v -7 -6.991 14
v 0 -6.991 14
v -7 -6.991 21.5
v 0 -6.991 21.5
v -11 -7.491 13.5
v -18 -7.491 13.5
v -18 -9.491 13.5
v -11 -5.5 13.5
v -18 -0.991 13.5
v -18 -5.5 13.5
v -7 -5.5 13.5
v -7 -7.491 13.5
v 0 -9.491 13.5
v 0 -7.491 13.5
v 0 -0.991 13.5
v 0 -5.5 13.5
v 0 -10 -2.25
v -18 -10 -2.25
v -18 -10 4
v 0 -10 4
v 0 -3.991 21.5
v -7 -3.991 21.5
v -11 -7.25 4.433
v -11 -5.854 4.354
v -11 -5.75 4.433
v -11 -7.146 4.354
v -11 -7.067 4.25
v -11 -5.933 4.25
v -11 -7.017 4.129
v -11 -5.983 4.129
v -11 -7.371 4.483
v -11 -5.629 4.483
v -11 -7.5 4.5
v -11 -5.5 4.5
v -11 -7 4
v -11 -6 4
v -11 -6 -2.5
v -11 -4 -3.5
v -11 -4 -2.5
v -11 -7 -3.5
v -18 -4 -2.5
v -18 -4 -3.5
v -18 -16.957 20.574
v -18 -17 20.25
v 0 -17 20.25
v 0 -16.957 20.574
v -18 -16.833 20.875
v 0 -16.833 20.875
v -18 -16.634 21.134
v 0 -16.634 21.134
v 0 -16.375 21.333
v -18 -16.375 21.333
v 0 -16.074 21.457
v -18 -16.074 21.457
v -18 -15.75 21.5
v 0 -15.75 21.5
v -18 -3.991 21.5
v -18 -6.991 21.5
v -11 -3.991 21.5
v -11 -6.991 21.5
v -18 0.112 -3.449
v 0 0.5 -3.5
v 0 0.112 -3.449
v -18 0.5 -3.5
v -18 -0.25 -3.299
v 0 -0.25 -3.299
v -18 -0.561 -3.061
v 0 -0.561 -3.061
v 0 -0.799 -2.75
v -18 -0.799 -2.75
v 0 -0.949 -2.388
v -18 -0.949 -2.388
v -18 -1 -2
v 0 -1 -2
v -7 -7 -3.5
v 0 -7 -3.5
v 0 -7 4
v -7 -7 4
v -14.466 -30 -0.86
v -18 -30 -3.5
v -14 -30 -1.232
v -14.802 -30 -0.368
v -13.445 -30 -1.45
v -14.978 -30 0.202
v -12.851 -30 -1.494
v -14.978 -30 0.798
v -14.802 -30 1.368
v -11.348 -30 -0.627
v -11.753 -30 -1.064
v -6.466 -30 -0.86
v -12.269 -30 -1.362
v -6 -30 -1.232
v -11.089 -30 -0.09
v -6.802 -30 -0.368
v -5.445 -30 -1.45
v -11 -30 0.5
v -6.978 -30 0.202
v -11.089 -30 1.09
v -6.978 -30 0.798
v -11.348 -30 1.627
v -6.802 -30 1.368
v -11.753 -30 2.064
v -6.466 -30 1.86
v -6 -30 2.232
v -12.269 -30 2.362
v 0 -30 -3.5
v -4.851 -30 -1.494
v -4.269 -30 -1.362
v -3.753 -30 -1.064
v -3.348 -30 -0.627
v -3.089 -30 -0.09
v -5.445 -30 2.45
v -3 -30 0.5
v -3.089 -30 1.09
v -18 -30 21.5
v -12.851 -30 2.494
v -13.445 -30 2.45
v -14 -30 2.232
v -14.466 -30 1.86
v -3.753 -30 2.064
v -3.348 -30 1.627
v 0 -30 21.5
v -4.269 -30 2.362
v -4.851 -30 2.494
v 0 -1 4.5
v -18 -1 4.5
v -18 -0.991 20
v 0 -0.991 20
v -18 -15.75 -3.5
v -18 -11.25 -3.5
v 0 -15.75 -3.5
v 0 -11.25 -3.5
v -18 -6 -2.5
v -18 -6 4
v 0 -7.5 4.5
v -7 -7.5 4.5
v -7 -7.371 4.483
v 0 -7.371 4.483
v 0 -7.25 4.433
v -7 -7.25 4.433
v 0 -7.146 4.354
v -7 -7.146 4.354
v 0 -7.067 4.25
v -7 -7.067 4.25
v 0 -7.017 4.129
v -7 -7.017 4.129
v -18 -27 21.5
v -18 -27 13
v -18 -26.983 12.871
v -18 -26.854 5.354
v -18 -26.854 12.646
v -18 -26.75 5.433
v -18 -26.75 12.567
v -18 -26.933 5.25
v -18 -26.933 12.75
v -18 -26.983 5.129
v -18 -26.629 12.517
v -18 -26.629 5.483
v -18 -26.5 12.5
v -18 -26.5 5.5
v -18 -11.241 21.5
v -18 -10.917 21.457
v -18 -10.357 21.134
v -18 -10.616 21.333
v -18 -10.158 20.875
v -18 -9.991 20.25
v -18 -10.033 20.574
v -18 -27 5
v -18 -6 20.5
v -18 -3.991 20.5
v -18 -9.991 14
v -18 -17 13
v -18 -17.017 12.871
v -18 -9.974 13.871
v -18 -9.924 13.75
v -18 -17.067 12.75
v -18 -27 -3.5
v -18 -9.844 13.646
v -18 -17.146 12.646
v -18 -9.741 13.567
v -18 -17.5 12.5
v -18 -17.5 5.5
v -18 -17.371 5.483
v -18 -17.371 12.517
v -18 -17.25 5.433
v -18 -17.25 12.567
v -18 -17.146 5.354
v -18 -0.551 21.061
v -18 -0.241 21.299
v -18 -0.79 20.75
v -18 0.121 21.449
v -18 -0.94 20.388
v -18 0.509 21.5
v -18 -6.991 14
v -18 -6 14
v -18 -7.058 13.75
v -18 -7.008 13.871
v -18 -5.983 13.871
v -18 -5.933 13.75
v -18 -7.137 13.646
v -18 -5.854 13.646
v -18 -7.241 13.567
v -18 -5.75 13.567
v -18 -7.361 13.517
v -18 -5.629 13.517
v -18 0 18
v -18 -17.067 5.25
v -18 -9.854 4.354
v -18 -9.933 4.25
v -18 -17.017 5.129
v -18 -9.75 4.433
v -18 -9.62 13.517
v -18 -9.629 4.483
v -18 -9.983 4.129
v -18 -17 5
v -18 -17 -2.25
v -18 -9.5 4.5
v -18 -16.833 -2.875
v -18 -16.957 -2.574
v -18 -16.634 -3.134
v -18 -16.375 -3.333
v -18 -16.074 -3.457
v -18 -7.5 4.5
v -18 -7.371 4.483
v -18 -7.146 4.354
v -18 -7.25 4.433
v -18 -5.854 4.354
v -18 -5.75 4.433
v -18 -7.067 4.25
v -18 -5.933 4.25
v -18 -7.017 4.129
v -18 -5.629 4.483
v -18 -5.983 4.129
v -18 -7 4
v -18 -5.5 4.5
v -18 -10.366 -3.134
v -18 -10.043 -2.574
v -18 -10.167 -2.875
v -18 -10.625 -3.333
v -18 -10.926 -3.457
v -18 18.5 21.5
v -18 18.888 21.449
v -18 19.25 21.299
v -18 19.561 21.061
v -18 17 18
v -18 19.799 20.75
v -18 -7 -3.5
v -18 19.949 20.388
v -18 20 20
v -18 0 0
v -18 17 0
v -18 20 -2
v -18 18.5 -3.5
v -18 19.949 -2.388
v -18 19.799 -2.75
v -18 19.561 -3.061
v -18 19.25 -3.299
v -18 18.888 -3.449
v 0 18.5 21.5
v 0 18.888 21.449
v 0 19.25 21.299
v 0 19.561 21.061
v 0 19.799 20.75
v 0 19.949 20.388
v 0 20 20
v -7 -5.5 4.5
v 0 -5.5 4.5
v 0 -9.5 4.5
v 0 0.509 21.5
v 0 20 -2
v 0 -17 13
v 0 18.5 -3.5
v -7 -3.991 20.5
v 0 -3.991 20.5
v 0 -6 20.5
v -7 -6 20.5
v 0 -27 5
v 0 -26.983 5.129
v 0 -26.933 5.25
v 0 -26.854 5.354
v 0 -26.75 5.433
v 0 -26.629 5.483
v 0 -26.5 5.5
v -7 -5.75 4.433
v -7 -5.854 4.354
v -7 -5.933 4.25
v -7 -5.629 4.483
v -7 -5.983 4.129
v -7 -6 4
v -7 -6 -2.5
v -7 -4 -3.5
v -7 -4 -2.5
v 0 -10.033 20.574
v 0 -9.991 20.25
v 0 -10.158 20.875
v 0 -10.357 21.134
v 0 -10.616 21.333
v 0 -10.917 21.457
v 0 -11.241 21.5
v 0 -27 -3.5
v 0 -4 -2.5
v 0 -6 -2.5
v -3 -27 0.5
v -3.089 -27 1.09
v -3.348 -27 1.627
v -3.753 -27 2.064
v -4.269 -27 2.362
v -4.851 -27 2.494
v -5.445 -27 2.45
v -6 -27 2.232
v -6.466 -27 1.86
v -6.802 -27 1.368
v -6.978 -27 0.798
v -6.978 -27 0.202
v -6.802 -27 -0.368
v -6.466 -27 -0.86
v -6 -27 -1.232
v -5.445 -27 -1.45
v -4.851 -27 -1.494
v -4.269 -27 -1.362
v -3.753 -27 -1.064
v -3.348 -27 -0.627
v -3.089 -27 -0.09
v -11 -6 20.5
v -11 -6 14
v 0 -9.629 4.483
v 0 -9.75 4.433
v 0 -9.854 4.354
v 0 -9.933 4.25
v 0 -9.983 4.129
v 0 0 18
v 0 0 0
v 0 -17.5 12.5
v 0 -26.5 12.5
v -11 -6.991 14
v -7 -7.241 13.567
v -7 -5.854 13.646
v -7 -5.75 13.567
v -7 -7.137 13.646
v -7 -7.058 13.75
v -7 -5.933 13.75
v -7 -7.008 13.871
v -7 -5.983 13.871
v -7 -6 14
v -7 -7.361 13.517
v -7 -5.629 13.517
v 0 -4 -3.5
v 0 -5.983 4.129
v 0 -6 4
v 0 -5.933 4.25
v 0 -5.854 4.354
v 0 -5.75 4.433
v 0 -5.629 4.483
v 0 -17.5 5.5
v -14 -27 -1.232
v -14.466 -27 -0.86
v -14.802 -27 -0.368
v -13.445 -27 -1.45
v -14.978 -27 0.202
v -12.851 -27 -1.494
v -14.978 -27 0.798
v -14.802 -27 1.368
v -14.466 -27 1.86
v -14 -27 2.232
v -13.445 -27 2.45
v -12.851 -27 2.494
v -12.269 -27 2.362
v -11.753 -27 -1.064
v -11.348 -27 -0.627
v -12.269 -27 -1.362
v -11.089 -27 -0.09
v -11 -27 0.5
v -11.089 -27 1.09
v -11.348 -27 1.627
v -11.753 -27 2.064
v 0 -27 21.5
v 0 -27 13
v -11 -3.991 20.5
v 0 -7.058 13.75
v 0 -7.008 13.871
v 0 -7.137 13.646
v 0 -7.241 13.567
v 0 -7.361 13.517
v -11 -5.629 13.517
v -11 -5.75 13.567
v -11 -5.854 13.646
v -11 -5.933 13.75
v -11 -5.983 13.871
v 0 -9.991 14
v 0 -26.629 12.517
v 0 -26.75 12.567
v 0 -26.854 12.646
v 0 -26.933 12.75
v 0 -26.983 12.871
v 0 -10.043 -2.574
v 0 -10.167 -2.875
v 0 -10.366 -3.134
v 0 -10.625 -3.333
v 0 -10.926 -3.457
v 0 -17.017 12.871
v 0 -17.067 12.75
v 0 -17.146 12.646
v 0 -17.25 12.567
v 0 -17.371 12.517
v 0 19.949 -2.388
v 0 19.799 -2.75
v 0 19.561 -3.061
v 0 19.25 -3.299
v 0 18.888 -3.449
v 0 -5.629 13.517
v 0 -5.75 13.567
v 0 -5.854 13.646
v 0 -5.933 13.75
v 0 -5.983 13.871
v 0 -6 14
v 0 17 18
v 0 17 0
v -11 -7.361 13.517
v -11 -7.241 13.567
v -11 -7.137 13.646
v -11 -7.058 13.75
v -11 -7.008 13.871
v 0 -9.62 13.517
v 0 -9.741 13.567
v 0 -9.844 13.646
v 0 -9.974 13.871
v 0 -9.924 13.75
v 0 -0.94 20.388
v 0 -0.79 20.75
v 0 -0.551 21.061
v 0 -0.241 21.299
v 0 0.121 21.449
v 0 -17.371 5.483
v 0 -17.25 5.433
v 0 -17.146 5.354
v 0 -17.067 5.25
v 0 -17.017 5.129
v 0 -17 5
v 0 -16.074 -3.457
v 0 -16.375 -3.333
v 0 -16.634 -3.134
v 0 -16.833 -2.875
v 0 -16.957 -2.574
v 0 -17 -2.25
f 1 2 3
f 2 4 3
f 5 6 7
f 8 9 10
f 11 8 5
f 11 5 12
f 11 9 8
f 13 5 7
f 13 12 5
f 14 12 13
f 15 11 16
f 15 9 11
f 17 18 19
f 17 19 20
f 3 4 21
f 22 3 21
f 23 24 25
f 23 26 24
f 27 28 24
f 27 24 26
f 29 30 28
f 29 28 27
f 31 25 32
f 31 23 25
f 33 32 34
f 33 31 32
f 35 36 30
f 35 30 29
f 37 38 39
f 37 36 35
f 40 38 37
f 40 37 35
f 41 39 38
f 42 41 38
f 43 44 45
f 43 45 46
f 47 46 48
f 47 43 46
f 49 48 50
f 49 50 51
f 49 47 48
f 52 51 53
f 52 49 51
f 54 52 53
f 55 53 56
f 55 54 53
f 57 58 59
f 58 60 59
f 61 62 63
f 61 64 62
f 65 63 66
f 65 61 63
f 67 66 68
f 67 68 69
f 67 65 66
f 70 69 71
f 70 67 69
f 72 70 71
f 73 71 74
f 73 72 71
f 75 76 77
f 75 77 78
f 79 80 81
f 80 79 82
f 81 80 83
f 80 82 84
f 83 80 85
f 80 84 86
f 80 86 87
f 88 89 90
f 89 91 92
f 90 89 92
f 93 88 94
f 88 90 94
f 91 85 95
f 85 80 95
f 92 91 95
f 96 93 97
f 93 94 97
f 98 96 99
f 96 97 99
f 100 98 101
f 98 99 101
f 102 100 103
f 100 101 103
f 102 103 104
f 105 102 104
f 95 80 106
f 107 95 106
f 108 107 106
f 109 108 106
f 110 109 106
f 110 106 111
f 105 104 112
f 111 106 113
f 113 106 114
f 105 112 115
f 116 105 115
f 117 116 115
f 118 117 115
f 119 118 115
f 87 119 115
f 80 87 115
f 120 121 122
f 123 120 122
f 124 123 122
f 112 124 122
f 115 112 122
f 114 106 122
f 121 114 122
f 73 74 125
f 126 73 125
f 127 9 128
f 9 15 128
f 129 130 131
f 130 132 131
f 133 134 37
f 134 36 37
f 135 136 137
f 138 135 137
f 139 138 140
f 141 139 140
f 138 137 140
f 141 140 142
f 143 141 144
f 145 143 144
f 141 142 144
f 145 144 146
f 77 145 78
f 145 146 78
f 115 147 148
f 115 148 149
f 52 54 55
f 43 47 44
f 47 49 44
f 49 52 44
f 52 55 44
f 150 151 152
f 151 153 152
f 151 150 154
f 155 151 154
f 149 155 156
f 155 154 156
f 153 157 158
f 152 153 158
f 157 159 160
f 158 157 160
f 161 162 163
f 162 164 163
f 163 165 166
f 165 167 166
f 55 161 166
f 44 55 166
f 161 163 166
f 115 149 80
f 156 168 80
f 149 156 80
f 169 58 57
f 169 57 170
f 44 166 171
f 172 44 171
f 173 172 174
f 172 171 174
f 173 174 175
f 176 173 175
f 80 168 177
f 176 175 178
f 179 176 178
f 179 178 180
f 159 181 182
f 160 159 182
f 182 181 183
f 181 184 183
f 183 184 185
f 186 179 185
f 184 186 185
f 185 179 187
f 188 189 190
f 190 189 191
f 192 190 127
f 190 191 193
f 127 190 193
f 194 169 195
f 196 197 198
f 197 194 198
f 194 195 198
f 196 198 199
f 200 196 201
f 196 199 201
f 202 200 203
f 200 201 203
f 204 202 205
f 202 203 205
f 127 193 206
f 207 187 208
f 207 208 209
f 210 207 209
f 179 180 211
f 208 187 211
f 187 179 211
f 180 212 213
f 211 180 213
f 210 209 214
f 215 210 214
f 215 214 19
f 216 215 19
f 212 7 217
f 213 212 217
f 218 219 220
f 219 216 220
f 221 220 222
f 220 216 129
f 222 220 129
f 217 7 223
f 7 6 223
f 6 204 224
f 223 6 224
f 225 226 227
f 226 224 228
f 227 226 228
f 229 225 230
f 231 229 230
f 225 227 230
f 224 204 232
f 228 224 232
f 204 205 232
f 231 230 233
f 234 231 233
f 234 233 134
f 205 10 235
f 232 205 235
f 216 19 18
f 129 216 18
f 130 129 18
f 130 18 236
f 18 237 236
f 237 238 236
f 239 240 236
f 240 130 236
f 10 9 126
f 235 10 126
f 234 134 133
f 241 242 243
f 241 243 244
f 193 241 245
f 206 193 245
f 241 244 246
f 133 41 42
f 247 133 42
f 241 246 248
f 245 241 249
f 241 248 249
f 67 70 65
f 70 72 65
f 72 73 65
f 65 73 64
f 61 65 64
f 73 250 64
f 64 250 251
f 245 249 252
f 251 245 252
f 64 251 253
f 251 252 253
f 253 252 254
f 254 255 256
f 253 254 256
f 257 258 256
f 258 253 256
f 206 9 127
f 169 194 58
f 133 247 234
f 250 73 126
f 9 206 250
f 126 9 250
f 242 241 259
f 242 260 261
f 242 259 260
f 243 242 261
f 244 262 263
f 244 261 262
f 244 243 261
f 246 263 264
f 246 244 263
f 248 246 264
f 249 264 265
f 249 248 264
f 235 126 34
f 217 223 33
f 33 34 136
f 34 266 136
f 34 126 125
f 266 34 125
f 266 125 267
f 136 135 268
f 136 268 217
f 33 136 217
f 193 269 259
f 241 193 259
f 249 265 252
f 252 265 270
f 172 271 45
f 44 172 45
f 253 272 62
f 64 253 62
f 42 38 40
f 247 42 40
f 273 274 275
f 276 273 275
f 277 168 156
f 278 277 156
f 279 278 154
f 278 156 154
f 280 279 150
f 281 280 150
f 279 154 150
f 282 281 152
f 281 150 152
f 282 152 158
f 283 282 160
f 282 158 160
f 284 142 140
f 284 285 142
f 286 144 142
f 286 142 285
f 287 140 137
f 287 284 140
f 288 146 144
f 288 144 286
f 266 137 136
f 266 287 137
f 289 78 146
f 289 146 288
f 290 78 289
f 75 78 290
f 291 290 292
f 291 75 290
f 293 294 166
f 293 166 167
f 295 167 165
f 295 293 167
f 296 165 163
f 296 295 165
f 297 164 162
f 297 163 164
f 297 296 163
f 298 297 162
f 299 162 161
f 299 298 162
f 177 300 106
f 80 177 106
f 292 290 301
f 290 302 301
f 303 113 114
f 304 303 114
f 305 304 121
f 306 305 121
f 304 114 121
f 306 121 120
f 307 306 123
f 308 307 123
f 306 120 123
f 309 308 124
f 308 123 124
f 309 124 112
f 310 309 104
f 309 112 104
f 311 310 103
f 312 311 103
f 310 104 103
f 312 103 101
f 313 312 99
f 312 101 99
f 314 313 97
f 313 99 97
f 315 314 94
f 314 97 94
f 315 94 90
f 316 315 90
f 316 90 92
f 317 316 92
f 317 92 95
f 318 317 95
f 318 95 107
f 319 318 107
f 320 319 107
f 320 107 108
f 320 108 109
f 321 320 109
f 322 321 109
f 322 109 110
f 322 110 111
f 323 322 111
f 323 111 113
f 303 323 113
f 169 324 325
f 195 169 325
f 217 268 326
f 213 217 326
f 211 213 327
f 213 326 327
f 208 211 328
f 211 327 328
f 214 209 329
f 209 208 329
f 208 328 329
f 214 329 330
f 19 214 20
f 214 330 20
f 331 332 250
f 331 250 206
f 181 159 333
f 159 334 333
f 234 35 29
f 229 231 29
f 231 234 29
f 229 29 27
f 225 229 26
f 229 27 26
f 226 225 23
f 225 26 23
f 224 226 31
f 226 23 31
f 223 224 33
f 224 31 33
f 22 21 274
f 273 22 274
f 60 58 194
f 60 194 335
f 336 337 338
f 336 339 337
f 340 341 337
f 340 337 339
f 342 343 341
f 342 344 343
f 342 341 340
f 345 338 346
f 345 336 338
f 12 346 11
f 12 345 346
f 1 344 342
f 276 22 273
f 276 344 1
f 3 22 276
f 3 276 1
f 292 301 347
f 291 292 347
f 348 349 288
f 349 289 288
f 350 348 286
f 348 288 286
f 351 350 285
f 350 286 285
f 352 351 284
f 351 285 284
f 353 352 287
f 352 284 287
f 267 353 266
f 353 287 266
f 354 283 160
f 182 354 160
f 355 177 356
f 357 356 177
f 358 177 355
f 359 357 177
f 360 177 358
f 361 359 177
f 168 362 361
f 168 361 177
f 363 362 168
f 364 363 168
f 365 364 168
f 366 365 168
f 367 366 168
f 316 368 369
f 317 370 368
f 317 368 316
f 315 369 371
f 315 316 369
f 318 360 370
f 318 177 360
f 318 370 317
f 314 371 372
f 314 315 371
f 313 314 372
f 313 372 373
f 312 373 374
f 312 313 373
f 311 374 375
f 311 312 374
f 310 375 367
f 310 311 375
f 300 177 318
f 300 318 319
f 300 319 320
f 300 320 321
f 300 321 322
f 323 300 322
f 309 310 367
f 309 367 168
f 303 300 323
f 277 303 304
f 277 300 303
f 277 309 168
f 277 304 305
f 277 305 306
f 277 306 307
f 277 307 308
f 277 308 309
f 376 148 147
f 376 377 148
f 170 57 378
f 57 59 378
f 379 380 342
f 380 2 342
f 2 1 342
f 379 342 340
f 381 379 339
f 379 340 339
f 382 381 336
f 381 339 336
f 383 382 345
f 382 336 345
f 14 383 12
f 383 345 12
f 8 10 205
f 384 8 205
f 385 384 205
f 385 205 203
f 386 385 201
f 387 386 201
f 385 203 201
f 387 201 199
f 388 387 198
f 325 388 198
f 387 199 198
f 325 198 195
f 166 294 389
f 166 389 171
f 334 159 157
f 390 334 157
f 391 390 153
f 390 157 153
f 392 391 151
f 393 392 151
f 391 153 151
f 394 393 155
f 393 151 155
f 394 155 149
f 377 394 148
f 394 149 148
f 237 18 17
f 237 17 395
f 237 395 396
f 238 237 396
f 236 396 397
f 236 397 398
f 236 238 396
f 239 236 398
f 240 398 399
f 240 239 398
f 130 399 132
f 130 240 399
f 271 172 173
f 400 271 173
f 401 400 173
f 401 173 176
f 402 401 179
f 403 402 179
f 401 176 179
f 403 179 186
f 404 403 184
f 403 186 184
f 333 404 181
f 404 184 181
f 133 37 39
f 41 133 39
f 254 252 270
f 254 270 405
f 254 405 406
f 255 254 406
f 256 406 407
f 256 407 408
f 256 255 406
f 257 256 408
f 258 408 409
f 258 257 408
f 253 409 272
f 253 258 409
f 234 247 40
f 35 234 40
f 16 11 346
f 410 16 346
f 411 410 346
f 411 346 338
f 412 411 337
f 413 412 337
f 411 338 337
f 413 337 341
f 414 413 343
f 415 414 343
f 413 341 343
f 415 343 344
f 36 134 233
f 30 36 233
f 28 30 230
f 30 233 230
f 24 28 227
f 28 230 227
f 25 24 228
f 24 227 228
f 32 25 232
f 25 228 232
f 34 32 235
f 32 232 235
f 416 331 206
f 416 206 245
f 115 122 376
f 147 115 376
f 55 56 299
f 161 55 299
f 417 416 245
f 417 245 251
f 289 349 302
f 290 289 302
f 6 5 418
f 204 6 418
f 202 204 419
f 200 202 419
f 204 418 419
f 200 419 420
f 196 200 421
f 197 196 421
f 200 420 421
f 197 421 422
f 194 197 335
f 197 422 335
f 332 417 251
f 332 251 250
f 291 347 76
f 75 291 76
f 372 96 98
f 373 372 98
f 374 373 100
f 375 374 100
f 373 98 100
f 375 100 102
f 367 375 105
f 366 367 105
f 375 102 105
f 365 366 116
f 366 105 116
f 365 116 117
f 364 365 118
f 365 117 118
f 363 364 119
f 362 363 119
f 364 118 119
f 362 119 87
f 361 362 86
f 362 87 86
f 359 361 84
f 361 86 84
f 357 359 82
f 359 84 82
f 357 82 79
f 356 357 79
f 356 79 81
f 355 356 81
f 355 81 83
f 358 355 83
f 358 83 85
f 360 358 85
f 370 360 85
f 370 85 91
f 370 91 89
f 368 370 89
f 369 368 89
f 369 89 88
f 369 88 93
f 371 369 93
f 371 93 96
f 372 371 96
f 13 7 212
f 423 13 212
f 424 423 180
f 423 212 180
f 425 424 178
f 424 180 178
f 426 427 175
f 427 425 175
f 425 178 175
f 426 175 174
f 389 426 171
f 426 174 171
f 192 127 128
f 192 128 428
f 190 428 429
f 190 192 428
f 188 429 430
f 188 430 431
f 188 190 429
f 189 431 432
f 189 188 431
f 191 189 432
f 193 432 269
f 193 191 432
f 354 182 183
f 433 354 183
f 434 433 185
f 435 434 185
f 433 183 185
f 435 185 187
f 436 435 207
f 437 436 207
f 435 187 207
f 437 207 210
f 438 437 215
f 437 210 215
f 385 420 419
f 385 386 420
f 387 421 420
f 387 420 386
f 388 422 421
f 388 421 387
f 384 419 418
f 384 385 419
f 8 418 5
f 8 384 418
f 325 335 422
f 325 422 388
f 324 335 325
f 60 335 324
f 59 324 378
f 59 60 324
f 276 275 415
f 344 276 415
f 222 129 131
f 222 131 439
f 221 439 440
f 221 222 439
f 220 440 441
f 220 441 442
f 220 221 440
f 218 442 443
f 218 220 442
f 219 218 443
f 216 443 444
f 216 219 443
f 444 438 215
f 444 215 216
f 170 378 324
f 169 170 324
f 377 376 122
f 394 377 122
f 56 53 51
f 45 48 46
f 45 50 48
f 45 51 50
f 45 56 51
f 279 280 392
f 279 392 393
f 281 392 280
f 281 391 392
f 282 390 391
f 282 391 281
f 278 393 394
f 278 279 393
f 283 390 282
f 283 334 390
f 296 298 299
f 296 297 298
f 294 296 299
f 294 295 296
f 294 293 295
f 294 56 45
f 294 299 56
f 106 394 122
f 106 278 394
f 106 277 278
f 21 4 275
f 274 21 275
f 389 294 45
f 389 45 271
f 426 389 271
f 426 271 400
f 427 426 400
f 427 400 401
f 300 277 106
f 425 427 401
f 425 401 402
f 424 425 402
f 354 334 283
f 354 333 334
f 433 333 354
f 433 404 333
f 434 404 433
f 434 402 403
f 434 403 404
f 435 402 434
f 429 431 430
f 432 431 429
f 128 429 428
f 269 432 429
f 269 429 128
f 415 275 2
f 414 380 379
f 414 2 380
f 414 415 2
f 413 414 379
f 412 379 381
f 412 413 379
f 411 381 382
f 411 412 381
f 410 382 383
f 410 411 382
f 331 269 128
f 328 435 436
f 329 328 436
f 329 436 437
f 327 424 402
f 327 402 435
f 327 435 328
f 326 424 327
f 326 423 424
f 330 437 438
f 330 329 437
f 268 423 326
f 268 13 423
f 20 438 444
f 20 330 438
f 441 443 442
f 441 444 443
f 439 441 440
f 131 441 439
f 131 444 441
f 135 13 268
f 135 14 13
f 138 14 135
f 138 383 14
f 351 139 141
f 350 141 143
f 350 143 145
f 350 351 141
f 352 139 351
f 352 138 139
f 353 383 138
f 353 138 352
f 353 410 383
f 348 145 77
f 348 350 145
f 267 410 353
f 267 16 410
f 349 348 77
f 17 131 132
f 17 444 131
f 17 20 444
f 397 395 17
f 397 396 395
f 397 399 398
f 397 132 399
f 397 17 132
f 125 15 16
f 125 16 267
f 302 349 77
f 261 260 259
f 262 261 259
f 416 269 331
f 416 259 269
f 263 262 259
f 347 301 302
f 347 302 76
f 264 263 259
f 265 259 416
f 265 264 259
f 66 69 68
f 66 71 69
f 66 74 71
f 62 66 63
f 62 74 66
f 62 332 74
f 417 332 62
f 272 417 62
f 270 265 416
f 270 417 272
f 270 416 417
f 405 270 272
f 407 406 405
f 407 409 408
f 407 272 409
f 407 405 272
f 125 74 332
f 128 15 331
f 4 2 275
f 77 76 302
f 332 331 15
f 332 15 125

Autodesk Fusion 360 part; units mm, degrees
sketch "Sketch1" plane through (0, 0, 0) normal (1, 0, 0) x (0, 0, -1)
  line L0 (0, 0) -> (-18, 0)
  line L1 (-18, 0) -> (-18, 17)
  line L2 (-18, 17) -> (0, 17)
  line L3 (0, 17) -> (0, 0)
  line L4 (-21.5, 20) -> (3.5, 20)
  line L5 (3.5, 20) -> (3.5, -30)
  line L6 (3.5, -30) -> (-21.5, -30)
  line L7 (-21.5, -30) -> (-21.5, 20)
  dimension "d1" = 18
  dimension "d2" = 17
  dimension "d3" = 25
  dimension "d4" = 50
  dimension "d66" = 3.5
extrude "Extrude1" add sketch "Sketch1" against normal blind 18
fillet "Fillet1" radius 1.5 2 edges at (-9, 20, -3.5) (-9, 20, 21.5)
sketch "Sketch2" plane through (0, 0, 0) normal (1, 0, 0) x (0, 0, -1)
  line L0 (-18, 17) -> (0, 17)
  line L1 (0, 17) -> (0, 0)
  line L2 (0, 0) -> (-18, 0)
  line L3 (-18, 0) -> (-18, 17)
  arc A0 (-20, 20) -> (-21.5, 18.5) centre (-20, 18.5) ccw
  line L4 (-21.5, 18.5) -> (-21.5, -30)
  line L5 (-21.5, -30) -> (3.5, -30)
  line L6 (3.5, -30) -> (3.5, 18.5)
  arc A1 (3.5, 18.5) -> (2, 20) centre (2, 18.5) ccw
  line L7 (2, 20) -> (-20, 20)
  line L8 (-21.5, -3.9907) -> (-20.5, -3.9907)
  line L9 (-20.5, -3.9907) -> (-20.5, -6)
  line L10 (-20.5, -6) -> (-13.5, -6)
  line L11 (-13.5, -6) -> (-13.5, -0.9907)
  line L12 (-13.5, -0.9907) -> (-21.5, -0.9907)
  line L13 (3.5, -1) -> (-4.5, -1)
  line L14 (-4.5, -1) -> (-4.5, -6)
  line L15 (-4.5, -6) -> (2.5, -6)
  line L16 (2.5, -6) -> (2.5, -4)
  line L17 (2.5, -4) -> (3.5, -4)
  dimension "d9" = 7
  dimension "d10" = 8
  dimension "d12" = 5.0093
  dimension "d13" = 1
  dimension "d14" = 3
  dimension "d15" = 3
  dimension "d16" = 5
  dimension "d17" = 1
extrude "Extrude2" cut sketch "Sketch2" against normal blind 43 contours L4 L8 L9 L10 L11 L12 | L6 L13 L14 L15 L16 L17
sketch "Sketch3" plane through (0, 0, 21.5) normal (0, 0, 1) x (1, 0, 0)
  line L0 (0, -3.9907) -> (-18, -3.9907)
  line L1 (-18, -3.9907) -> (-18, -30)
  line L2 (-18, -30) -> (0, -30)
  line L3 (0, -30) -> (0, -3.9907)
  line L4 (0, -3.9907) -> (-7, -3.9907)
  line L5 (-7, -3.9907) -> (-7, -5.9907)
  line L6 (-7, -5.9907) -> (0, -5.9907)
  line L7 (0, -5.9907) -> (0, -3.9907)
  line L8 (-18, -3.9907) -> (-11, -3.9907)
  line L9 (-11, -3.9907) -> (-11, -5.9907)
  line L10 (-11, -5.9907) -> (-18, -5.9907)
  line L11 (-18, -5.9907) -> (-18, -3.9907)
  line L12 (-11, -3.9907) -> (-7, -3.9907)
  line L13 (-7, -3.9907) -> (-7, -5.9907)
  line L14 (-7, -5.9907) -> (-11, -5.9907)
  line L15 (-11, -5.9907) -> (-11, -3.9907)
  dimension "d21" = 7
  dimension "d22" = 2
  dimension "d23" = 7
  dimension "d24" = 2
extrude "Extrude3" cut sketch "Sketch3" against normal blind 8 contours L0 L5 L9 L12 L13 L14 L15
sketch "Sketch4" plane through (0, 0, -3.5) normal (0, 0, -1) x (-1, 0, 0)
  line L0 (18, -4) -> (0, -4)
  line L1 (0, -4) -> (0, -30)
  line L2 (0, -30) -> (18, -30)
  line L3 (18, -30) -> (18, -4)
  line L4 (0, -4) -> (7, -4)
  line L5 (7, -4) -> (7, -6)
  line L6 (7, -6) -> (0, -6)
  line L7 (0, -6) -> (0, -4)
  line L8 (18, -4) -> (11, -4)
  line L9 (11, -4) -> (11, -6)
  line L10 (11, -6) -> (18, -6)
  line L11 (18, -6) -> (18, -4)
  line L12 (7, -4) -> (11, -4)
  line L13 (11, -4) -> (11, -6)
  line L14 (11, -6) -> (7, -6)
  line L15 (7, -6) -> (7, -4)
  dimension "d27" = 7
  dimension "d28" = 2
  dimension "d29" = 7
  dimension "d30" = 2
extrude "Extrude4" cut sketch "Sketch4" against normal blind 8 contours L0 L5 L9 L12 L13 L14 L15
sketch "Sketch5" plane through (0, 0, -3.5) normal (0, 0, -1) x (-1, 0, 0)
  line L0 (7, -6) -> (7, -4)
  line L1 (7, -4) -> (0, -4)
  line L2 (0, -4) -> (0, -30)
  line L3 (0, -30) -> (18, -30)
  line L4 (18, -30) -> (18, -4)
  line L5 (18, -4) -> (11, -4)
  line L6 (11, -4) -> (11, -6)
  line L7 (11, -6) -> (7, -6)
  line L8 (7, -4) -> (11, -4)
  line L9 (11, -4) -> (11, -10)
  line L10 (11, -10) -> (7, -10)
  line L11 (7, -10) -> (7, -4)
  line L12 (11, -10) -> (18, -10)
  line L13 (18, -10) -> (18, -7)
  line L14 (18, -7) -> (11, -7)
  line L15 (11, -7) -> (11, -10)
  line L16 (7, -10) -> (0, -10)
  line L17 (0, -10) -> (0, -7)
  line L18 (0, -7) -> (7, -7)
  line L19 (7, -7) -> (7, -10)
  dimension "d33" = 3
extrude "Extrude5" cut sketch "Sketch5" against normal blind 8 contours L0 L6 L7 L8 L9 L11 | L7 L9 L10 L11 L15 L19 | L2 L11 L16 L17 L18 L19 | L4 L9 L12 L13 L14 L15
sketch "Sketch6" plane through (0, 0, 21.5) normal (0, 0, 1) x (1, 0, 0)
  line L0 (-11, -5.9907) -> (-11, -3.9907)
  line L1 (-11, -3.9907) -> (-18, -3.9907)
  line L2 (-18, -3.9907) -> (-18, -30)
  line L3 (-18, -30) -> (0, -30)
  line L4 (0, -30) -> (0, -3.9907)
  line L5 (0, -3.9907) -> (-7, -3.9907)
  line L6 (-7, -3.9907) -> (-7, -5.9907)
  line L7 (-7, -5.9907) -> (-11, -5.9907)
  line L8 (-11, -5.9907) -> (-7, -5.9907)
  line L9 (-7, -5.9907) -> (-7, -9.9907)
  line L10 (-7, -9.9907) -> (-11, -9.9907)
  line L11 (-11, -9.9907) -> (-11, -5.9907)
  line L12 (-7, -9.9907) -> (0, -9.9907)
  line L13 (0, -9.9907) -> (0, -6.9907)
  line L14 (0, -6.9907) -> (-7, -6.9907)
  line L15 (-7, -6.9907) -> (-7, -9.9907)
  line L16 (-11, -9.9907) -> (-18, -9.9907)
  line L17 (-18, -9.9907) -> (-18, -6.9907)
  line L18 (-18, -6.9907) -> (-11, -6.9907)
  line L19 (-11, -6.9907) -> (-11, -9.9907)
  dimension "d36" = 4
  dimension "d37" = 3
  dimension "d38" = 3
  dimension "d39" = 7
extrude "Extrude6" cut sketch "Sketch6" against normal blind 8 contours L7 L8 L9 L10 L11 L15 L19 | L2 L11 L16 L17 L18 L19 | L4 L9 L12 L13 L14 L15
sketch "Sketch7" plane through (0, -30, 0) normal (0, -1, 0) x (1, 0, 0)
  line L0 (0, -3.5) -> (0, 21.5)
  line L1 (0, 21.5) -> (-18, 21.5)
  line L2 (-18, 21.5) -> (-18, -3.5)
  line L3 (-18, -3.5) -> (0, -3.5)
sketch "Sketch8" plane through (0, 0, 0) normal (1, 0, 0) x (0, 0, -1)
  line L0 (-13.5, -9.9907) -> (-21.5, -9.9907)
  line L1 (-21.5, -9.9907) -> (-21.5, -30)
  line L2 (-21.5, -30) -> (3.5, -30)
  line L3 (3.5, -30) -> (3.5, -10)
  line L4 (3.5, -10) -> (-4.5, -10)
  line L5 (-4.5, -10) -> (-4.5, -7)
  line L6 (-4.5, -7) -> (3.5, -7)
  line L7 (3.5, -7) -> (3.5, -4)
  line L8 (3.5, -4) -> (2.5, -4)
  line L9 (2.5, -4) -> (2.5, -6)
  line L10 (2.5, -6) -> (-4.5, -6)
  line L11 (-4.5, -6) -> (-4.5, -1)
  line L12 (-4.5, -1) -> (3.5, -1)
  line L13 (3.5, -1) -> (3.5, 18.5)
  arc A0 (3.5, 18.5) -> (2, 20) centre (2, 18.5) ccw
  line L14 (2, 20) -> (-20, 20)
  arc A1 (-20, 20) -> (-21.5, 18.5) centre (-20, 18.5) ccw
  line L15 (-21.5, 18.5) -> (-21.5, -0.9907)
  line L16 (-21.5, -0.9907) -> (-13.5, -0.9907)
  line L17 (-13.5, -0.9907) -> (-13.5, -6)
  line L18 (-13.5, -6) -> (-20.5, -6)
  line L19 (-20.5, -6) -> (-20.5, -3.9907)
  line L20 (-20.5, -3.9907) -> (-21.5, -3.9907)
  line L21 (-21.5, -3.9907) -> (-21.5, -6.9907)
  line L22 (-21.5, -6.9907) -> (-13.5, -6.9907)
  line L23 (-13.5, -6.9907) -> (-13.5, -9.9907)
  line L24 (-18, 17) -> (0, 17)
  line L25 (0, 17) -> (0, 0)
  line L26 (0, 0) -> (-18, 0)
  line L27 (-18, 0) -> (-18, 17)
  line L28 (-21.5, -30) -> (3.5, -30)
  line L29 (3.5, -30) -> (3.5, -27)
  line L30 (3.5, -27) -> (-21.5, -27)
  line L31 (-21.5, -27) -> (-21.5, -30)
  line L32 (-21.5, -27) -> (-12.5, -27)
  line L33 (-12.5, -27) -> (-12.5, -23)
  line L34 (-12.5, -23) -> (-21.5, -23)
  line L35 (-21.5, -23) -> (-21.5, -27)
  line L36 (3.5, -27) -> (-5.5, -27)
  line L37 (-5.5, -27) -> (-5.5, -23)
  line L38 (-5.5, -23) -> (3.5, -23)
  line L39 (3.5, -23) -> (3.5, -27)
  dimension "d42" = 3
extrude "Extrude7" cut sketch "Sketch8" against normal blind 32 contours L1 L30 L32 L33 L34 L35 | L3 L30 L36 L37 L38 L39
fillet "Fillet2" radius 0.5 8 edges at (-14.5, -6, 13.5) (-3.5, -6, 13.5) (-3.5, -6.9907, 13.5) (-14.5, -6.9907, 13.5) (-3.5, -7, 4.5) (-3.5, -6, 4.5) (-14.5, -6, 4.5) (-14.5, -7, 4.5)
sketch "Sketch9" plane through (0, -30, 0) normal (0, -1, 0) x (1, 0, 0)
  line L0 (0, 20) -> (-18, 20)
  line L1 (-18, 20) -> (-18, -5)
  line L2 (-18, -5) -> (0, -5)
  line L3 (0, -5) -> (0, 20)
  line L4 (0, 20) -> (0, 7.5)
  line L5 (0, 7.5) -> (-18, 7.5)
  line L6 (-18, 7.5) -> (-13, 7.5)
  circle A0 centre (-13, 0.5) radius 2
  line L7 (-9, -5) -> (-9, 20)
  circle A1 centre (-5, 0.5) radius 2
  dimension "d50" = 4
  dimension "d63" = 4
  dimension "d64" = 4
  dimension "d65" = 4
extrude "Extrude8" cut sketch "Sketch9" against normal blind 5 contours A0 | A1
extrude "Extrude9" cut 2 faces at (-12, -23, 15.5) (-12, -23, -0.5) along direction (0, 1, 0) blind 6
fillet "Fillet3" radius 1.25 4 edges at (-9, -9.9907, 21.5) (-9, -17, 21.5) (-9, -10, -3.5) (-9, -17, -3.5)
fillet "Fillet4" radius 0.5 4 edges at (-9, -10, 4.5) (-9, -17, 5.5) (-9, -17, 12.5) (-9, -9.9907, 13.5)
fillet "Fillet5" radius 0.5 2 edges at (-9, -27, 12.5) (-9, -27, 5.5)
fillet "Fillet6" radius 1.5 2 edges at (-9, -1, -3.5) (-9, -0.9907, 21.5)
